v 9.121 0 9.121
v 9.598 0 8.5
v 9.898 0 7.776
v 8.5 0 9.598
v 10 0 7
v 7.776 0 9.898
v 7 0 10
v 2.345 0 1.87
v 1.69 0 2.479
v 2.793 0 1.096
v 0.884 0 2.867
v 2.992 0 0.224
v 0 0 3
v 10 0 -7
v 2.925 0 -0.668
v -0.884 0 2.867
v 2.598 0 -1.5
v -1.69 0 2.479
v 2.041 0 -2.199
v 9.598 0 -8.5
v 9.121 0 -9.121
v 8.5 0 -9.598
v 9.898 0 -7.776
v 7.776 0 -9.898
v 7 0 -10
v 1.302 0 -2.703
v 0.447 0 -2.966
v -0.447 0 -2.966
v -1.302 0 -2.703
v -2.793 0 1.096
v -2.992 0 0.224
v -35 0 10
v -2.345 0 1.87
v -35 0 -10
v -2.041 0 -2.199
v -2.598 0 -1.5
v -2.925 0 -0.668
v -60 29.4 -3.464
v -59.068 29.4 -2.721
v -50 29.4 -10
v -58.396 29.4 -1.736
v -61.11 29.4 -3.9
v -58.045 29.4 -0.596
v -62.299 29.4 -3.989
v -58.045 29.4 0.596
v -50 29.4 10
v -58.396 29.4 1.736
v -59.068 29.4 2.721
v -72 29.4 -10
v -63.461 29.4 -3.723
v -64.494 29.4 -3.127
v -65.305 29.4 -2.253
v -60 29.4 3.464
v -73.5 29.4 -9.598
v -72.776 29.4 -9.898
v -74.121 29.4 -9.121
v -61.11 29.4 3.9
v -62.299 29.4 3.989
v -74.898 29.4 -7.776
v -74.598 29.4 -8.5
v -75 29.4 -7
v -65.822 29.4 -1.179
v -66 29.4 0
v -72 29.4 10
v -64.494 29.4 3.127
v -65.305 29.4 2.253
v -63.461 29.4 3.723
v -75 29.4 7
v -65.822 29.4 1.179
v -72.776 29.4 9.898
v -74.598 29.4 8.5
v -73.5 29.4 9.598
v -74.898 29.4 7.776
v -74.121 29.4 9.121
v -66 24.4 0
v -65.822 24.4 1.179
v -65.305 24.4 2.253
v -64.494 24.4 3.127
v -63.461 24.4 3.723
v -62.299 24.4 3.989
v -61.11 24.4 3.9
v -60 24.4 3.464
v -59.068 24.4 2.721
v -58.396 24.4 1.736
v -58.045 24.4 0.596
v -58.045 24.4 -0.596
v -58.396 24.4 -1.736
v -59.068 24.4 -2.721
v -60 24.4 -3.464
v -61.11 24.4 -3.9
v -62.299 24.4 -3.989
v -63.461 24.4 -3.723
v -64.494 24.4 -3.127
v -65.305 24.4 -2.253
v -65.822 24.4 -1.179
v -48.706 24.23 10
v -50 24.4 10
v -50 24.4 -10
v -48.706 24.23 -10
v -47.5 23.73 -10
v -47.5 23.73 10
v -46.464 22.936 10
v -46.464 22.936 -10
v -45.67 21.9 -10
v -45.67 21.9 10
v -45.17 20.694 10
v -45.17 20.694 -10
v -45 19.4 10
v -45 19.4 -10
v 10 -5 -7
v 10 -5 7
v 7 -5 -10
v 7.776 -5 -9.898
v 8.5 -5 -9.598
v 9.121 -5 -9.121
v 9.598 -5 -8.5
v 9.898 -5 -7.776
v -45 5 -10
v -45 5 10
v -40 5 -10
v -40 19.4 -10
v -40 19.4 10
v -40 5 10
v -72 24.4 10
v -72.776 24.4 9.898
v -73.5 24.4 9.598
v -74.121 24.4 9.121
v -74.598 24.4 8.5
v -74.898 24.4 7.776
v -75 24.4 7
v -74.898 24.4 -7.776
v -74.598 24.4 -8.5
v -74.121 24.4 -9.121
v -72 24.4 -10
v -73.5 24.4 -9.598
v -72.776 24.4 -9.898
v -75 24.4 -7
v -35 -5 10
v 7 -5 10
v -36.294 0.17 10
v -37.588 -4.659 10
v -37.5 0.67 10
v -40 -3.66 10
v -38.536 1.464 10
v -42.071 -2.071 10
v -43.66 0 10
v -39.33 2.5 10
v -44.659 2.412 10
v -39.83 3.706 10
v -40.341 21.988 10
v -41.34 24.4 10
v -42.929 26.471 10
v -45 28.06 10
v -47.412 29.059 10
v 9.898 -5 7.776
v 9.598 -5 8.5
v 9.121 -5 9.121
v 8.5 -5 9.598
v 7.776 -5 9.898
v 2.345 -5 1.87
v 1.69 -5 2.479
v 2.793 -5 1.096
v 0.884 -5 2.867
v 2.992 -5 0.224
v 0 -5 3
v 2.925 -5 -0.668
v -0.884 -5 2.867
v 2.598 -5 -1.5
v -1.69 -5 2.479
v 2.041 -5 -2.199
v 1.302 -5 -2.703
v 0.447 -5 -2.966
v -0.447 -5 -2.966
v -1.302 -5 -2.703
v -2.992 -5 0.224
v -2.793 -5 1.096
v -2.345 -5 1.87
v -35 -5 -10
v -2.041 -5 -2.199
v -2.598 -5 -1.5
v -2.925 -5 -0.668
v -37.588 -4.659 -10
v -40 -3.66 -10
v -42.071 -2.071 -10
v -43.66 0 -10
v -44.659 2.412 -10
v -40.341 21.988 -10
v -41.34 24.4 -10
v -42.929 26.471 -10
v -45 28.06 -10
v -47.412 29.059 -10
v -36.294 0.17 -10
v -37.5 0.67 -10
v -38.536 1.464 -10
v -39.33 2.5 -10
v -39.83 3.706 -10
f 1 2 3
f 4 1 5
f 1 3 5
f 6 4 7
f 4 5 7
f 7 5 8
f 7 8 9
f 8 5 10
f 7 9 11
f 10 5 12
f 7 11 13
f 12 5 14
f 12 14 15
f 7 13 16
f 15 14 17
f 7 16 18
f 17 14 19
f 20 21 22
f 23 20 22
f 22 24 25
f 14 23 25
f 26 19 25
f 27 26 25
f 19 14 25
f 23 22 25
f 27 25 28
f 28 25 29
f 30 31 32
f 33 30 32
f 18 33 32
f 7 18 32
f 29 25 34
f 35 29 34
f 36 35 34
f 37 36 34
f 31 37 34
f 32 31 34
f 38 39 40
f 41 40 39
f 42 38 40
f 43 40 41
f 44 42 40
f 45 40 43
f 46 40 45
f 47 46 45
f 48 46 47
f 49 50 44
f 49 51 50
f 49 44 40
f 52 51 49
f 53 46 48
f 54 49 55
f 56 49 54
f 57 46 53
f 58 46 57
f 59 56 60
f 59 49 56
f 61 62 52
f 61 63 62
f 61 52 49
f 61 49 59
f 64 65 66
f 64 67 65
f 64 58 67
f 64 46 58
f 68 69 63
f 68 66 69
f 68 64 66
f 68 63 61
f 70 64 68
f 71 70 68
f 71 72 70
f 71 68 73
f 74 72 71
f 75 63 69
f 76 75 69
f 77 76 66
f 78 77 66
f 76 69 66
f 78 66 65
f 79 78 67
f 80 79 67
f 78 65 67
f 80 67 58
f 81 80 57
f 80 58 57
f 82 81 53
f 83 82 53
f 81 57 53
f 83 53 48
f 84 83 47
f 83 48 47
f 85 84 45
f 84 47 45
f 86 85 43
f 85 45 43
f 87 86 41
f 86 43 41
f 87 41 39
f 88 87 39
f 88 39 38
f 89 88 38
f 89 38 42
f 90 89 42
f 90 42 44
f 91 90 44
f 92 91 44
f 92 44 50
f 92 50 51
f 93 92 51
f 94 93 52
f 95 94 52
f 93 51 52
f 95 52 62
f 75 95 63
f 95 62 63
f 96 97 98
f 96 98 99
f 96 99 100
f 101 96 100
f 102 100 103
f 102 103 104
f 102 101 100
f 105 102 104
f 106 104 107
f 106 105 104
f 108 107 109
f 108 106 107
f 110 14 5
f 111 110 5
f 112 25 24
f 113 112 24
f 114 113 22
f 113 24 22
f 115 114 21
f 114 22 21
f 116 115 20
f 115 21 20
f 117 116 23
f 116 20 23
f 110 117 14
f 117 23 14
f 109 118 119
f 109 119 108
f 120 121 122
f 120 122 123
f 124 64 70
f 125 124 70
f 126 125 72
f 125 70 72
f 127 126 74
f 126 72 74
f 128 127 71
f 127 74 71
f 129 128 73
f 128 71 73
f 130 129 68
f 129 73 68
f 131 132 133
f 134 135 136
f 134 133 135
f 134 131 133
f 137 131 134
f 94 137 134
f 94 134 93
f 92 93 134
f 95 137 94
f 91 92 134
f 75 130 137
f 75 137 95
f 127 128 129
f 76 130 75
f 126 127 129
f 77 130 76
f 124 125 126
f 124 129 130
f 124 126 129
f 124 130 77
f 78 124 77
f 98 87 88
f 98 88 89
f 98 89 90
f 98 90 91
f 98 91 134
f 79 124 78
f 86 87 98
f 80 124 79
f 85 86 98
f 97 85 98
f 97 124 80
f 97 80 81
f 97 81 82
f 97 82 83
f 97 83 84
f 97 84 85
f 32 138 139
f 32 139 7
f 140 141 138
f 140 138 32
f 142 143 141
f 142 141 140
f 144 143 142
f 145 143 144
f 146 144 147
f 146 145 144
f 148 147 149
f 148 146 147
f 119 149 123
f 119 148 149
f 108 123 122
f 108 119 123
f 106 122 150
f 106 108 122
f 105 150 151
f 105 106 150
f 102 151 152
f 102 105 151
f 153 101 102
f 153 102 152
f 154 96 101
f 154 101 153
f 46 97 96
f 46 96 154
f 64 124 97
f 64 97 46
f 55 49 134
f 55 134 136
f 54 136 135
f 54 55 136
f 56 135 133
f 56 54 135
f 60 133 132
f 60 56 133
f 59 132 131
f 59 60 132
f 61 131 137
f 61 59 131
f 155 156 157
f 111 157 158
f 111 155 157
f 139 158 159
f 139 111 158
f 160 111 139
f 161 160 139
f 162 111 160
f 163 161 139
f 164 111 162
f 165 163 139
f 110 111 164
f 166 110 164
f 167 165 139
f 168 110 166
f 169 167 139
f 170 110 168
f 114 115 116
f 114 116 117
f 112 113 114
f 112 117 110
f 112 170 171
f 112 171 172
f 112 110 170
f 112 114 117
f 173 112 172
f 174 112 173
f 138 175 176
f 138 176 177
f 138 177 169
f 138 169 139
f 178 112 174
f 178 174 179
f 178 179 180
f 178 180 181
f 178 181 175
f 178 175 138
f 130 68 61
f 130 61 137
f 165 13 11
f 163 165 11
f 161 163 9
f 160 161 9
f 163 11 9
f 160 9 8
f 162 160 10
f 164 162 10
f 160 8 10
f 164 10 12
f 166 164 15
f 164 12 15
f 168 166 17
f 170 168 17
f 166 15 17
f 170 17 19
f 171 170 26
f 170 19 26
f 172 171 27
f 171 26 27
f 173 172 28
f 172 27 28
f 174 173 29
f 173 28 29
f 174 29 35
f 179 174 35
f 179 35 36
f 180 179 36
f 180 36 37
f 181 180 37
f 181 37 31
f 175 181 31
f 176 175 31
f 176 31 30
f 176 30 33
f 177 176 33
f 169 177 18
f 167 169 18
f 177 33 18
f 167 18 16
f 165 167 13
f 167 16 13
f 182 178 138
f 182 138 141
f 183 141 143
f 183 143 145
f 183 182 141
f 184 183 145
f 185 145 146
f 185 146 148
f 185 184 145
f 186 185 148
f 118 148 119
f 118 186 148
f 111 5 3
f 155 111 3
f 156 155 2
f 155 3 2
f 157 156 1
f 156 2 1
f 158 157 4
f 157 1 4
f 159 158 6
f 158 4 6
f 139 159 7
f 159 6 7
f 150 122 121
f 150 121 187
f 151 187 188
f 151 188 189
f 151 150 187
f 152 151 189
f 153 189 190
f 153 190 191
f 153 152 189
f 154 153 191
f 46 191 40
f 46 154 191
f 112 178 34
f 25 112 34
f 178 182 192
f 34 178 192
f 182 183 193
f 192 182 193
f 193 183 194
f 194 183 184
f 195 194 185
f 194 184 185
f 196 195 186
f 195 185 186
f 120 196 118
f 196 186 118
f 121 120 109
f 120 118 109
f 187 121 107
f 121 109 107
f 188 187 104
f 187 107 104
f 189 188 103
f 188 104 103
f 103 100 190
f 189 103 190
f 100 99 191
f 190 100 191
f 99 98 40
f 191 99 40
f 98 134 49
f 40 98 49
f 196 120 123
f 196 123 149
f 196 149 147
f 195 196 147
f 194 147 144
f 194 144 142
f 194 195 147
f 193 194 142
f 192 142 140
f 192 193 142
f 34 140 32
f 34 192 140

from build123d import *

# Parameters (mm, degrees)
SKETCH1_R          = 3
BASE_FLANGE1_DEPTH = 5
EDGE_FLANGE1_DEPTH = 20
EDGE_FLANGE2_DEPTH = 20
SKETCH15_R         = 4
CUT_EXTRUDE1_DEPTH = 5
CUT_EXTRUDE2_DEPTH = 5


# Sheet-metal steps are written as plain solids
with BuildPart() as part:
    # Sketch1 → Base-Flange1 (new body)
    with BuildSketch(Plane(origin=(0, 0, 0), x_dir=(1, 0, 0), z_dir=(0, 1, 0))):
        with BuildLine():
            Line((-35, 10), (7, 10))
            ThreePointArc((7, 10), (9.121320344, 9.121320344), (10, 7))
            Line((10, 7), (10, -7))
            ThreePointArc((10, -7), (9.121320344, -9.121320344), (7, -10))
            Line((7, -10), (-35, -10))
            Line((-35, -10), (-35, 10))
        make_face()
        with Locations(Location((0, 0, 0), (0, 0, 270))):
            Circle(SKETCH1_R, mode=Mode.SUBTRACT)
    extrude(amount=-BASE_FLANGE1_DEPTH)

    # Edge-Flange1 section (across the edge) → Edge-Flange1 (add)
    with BuildSketch(Plane(origin=(-40, 0, -10), x_dir=(1, 0, 0), z_dir=(0, 0, 1))):
        with BuildLine():
            Line((-5, 5), (-5, 19.4))
            Line((-5, 19.4), (0, 19.4))
            Line((0, 19.4), (0, 5))
            ThreePointArc((0, 5), (1.464466094, 1.464466094), (5, 0))
            Line((5, 0), (5, -5))
            ThreePointArc((5, -5), (-2.071067812, -2.071067812), (-5, 5))
        make_face()
    extrude(amount=EDGE_FLANGE1_DEPTH)

    # Edge-Flange2 section (across the edge) → Edge-Flange2 (add)
    with BuildSketch(Plane(origin=(-45, 24.4, 10), x_dir=(0, -1, 0), z_dir=(0, 0, -1))):
        with BuildLine():
            Line((-5, 5), (-5, 30))
            Line((-5, 30), (0, 30))
            Line((0, 30), (0, 5))
            ThreePointArc((0, 5), (1.464466094, 1.464466094), (5, 0))
            Line((5, 0), (5, -5))
            ThreePointArc((5, -5), (-2.071067812, -2.071067812), (-5, 5))
        make_face()
    extrude(amount=EDGE_FLANGE2_DEPTH)

    # Sketch15 → Cut-Extrude1 (cut)
    with BuildSketch(Plane(origin=(0, 29.4, 0), x_dir=(1, 0, 0), z_dir=(0, 1, 0))):
        with Locations(Location((-62, 0, 0), (0, 0, 180))):
            Circle(SKETCH15_R)
    extrude(amount=-CUT_EXTRUDE1_DEPTH, mode=Mode.SUBTRACT)

    # Sketch16 → Cut-Extrude2 (cut)
    with BuildSketch(Plane(origin=(0, 29.4, 0), x_dir=(1, 0, 0), z_dir=(0, 1, 0))):
        with BuildLine():
            Line((-75, 7), (-75, 10))
            Line((-75, 10), (-72, 10))
            ThreePointArc((-72, 10), (-74.121320344, 9.121320344), (-75, 7))
        make_face()
        with BuildLine():
            Line((-75, -7), (-75, -10))
            Line((-75, -10), (-72, -10))
            ThreePointArc((-72, -10), (-74.121320344, -9.121320344), (-75, -7))
        make_face()
    extrude(amount=-CUT_EXTRUDE2_DEPTH, mode=Mode.SUBTRACT)


solid = part.part
